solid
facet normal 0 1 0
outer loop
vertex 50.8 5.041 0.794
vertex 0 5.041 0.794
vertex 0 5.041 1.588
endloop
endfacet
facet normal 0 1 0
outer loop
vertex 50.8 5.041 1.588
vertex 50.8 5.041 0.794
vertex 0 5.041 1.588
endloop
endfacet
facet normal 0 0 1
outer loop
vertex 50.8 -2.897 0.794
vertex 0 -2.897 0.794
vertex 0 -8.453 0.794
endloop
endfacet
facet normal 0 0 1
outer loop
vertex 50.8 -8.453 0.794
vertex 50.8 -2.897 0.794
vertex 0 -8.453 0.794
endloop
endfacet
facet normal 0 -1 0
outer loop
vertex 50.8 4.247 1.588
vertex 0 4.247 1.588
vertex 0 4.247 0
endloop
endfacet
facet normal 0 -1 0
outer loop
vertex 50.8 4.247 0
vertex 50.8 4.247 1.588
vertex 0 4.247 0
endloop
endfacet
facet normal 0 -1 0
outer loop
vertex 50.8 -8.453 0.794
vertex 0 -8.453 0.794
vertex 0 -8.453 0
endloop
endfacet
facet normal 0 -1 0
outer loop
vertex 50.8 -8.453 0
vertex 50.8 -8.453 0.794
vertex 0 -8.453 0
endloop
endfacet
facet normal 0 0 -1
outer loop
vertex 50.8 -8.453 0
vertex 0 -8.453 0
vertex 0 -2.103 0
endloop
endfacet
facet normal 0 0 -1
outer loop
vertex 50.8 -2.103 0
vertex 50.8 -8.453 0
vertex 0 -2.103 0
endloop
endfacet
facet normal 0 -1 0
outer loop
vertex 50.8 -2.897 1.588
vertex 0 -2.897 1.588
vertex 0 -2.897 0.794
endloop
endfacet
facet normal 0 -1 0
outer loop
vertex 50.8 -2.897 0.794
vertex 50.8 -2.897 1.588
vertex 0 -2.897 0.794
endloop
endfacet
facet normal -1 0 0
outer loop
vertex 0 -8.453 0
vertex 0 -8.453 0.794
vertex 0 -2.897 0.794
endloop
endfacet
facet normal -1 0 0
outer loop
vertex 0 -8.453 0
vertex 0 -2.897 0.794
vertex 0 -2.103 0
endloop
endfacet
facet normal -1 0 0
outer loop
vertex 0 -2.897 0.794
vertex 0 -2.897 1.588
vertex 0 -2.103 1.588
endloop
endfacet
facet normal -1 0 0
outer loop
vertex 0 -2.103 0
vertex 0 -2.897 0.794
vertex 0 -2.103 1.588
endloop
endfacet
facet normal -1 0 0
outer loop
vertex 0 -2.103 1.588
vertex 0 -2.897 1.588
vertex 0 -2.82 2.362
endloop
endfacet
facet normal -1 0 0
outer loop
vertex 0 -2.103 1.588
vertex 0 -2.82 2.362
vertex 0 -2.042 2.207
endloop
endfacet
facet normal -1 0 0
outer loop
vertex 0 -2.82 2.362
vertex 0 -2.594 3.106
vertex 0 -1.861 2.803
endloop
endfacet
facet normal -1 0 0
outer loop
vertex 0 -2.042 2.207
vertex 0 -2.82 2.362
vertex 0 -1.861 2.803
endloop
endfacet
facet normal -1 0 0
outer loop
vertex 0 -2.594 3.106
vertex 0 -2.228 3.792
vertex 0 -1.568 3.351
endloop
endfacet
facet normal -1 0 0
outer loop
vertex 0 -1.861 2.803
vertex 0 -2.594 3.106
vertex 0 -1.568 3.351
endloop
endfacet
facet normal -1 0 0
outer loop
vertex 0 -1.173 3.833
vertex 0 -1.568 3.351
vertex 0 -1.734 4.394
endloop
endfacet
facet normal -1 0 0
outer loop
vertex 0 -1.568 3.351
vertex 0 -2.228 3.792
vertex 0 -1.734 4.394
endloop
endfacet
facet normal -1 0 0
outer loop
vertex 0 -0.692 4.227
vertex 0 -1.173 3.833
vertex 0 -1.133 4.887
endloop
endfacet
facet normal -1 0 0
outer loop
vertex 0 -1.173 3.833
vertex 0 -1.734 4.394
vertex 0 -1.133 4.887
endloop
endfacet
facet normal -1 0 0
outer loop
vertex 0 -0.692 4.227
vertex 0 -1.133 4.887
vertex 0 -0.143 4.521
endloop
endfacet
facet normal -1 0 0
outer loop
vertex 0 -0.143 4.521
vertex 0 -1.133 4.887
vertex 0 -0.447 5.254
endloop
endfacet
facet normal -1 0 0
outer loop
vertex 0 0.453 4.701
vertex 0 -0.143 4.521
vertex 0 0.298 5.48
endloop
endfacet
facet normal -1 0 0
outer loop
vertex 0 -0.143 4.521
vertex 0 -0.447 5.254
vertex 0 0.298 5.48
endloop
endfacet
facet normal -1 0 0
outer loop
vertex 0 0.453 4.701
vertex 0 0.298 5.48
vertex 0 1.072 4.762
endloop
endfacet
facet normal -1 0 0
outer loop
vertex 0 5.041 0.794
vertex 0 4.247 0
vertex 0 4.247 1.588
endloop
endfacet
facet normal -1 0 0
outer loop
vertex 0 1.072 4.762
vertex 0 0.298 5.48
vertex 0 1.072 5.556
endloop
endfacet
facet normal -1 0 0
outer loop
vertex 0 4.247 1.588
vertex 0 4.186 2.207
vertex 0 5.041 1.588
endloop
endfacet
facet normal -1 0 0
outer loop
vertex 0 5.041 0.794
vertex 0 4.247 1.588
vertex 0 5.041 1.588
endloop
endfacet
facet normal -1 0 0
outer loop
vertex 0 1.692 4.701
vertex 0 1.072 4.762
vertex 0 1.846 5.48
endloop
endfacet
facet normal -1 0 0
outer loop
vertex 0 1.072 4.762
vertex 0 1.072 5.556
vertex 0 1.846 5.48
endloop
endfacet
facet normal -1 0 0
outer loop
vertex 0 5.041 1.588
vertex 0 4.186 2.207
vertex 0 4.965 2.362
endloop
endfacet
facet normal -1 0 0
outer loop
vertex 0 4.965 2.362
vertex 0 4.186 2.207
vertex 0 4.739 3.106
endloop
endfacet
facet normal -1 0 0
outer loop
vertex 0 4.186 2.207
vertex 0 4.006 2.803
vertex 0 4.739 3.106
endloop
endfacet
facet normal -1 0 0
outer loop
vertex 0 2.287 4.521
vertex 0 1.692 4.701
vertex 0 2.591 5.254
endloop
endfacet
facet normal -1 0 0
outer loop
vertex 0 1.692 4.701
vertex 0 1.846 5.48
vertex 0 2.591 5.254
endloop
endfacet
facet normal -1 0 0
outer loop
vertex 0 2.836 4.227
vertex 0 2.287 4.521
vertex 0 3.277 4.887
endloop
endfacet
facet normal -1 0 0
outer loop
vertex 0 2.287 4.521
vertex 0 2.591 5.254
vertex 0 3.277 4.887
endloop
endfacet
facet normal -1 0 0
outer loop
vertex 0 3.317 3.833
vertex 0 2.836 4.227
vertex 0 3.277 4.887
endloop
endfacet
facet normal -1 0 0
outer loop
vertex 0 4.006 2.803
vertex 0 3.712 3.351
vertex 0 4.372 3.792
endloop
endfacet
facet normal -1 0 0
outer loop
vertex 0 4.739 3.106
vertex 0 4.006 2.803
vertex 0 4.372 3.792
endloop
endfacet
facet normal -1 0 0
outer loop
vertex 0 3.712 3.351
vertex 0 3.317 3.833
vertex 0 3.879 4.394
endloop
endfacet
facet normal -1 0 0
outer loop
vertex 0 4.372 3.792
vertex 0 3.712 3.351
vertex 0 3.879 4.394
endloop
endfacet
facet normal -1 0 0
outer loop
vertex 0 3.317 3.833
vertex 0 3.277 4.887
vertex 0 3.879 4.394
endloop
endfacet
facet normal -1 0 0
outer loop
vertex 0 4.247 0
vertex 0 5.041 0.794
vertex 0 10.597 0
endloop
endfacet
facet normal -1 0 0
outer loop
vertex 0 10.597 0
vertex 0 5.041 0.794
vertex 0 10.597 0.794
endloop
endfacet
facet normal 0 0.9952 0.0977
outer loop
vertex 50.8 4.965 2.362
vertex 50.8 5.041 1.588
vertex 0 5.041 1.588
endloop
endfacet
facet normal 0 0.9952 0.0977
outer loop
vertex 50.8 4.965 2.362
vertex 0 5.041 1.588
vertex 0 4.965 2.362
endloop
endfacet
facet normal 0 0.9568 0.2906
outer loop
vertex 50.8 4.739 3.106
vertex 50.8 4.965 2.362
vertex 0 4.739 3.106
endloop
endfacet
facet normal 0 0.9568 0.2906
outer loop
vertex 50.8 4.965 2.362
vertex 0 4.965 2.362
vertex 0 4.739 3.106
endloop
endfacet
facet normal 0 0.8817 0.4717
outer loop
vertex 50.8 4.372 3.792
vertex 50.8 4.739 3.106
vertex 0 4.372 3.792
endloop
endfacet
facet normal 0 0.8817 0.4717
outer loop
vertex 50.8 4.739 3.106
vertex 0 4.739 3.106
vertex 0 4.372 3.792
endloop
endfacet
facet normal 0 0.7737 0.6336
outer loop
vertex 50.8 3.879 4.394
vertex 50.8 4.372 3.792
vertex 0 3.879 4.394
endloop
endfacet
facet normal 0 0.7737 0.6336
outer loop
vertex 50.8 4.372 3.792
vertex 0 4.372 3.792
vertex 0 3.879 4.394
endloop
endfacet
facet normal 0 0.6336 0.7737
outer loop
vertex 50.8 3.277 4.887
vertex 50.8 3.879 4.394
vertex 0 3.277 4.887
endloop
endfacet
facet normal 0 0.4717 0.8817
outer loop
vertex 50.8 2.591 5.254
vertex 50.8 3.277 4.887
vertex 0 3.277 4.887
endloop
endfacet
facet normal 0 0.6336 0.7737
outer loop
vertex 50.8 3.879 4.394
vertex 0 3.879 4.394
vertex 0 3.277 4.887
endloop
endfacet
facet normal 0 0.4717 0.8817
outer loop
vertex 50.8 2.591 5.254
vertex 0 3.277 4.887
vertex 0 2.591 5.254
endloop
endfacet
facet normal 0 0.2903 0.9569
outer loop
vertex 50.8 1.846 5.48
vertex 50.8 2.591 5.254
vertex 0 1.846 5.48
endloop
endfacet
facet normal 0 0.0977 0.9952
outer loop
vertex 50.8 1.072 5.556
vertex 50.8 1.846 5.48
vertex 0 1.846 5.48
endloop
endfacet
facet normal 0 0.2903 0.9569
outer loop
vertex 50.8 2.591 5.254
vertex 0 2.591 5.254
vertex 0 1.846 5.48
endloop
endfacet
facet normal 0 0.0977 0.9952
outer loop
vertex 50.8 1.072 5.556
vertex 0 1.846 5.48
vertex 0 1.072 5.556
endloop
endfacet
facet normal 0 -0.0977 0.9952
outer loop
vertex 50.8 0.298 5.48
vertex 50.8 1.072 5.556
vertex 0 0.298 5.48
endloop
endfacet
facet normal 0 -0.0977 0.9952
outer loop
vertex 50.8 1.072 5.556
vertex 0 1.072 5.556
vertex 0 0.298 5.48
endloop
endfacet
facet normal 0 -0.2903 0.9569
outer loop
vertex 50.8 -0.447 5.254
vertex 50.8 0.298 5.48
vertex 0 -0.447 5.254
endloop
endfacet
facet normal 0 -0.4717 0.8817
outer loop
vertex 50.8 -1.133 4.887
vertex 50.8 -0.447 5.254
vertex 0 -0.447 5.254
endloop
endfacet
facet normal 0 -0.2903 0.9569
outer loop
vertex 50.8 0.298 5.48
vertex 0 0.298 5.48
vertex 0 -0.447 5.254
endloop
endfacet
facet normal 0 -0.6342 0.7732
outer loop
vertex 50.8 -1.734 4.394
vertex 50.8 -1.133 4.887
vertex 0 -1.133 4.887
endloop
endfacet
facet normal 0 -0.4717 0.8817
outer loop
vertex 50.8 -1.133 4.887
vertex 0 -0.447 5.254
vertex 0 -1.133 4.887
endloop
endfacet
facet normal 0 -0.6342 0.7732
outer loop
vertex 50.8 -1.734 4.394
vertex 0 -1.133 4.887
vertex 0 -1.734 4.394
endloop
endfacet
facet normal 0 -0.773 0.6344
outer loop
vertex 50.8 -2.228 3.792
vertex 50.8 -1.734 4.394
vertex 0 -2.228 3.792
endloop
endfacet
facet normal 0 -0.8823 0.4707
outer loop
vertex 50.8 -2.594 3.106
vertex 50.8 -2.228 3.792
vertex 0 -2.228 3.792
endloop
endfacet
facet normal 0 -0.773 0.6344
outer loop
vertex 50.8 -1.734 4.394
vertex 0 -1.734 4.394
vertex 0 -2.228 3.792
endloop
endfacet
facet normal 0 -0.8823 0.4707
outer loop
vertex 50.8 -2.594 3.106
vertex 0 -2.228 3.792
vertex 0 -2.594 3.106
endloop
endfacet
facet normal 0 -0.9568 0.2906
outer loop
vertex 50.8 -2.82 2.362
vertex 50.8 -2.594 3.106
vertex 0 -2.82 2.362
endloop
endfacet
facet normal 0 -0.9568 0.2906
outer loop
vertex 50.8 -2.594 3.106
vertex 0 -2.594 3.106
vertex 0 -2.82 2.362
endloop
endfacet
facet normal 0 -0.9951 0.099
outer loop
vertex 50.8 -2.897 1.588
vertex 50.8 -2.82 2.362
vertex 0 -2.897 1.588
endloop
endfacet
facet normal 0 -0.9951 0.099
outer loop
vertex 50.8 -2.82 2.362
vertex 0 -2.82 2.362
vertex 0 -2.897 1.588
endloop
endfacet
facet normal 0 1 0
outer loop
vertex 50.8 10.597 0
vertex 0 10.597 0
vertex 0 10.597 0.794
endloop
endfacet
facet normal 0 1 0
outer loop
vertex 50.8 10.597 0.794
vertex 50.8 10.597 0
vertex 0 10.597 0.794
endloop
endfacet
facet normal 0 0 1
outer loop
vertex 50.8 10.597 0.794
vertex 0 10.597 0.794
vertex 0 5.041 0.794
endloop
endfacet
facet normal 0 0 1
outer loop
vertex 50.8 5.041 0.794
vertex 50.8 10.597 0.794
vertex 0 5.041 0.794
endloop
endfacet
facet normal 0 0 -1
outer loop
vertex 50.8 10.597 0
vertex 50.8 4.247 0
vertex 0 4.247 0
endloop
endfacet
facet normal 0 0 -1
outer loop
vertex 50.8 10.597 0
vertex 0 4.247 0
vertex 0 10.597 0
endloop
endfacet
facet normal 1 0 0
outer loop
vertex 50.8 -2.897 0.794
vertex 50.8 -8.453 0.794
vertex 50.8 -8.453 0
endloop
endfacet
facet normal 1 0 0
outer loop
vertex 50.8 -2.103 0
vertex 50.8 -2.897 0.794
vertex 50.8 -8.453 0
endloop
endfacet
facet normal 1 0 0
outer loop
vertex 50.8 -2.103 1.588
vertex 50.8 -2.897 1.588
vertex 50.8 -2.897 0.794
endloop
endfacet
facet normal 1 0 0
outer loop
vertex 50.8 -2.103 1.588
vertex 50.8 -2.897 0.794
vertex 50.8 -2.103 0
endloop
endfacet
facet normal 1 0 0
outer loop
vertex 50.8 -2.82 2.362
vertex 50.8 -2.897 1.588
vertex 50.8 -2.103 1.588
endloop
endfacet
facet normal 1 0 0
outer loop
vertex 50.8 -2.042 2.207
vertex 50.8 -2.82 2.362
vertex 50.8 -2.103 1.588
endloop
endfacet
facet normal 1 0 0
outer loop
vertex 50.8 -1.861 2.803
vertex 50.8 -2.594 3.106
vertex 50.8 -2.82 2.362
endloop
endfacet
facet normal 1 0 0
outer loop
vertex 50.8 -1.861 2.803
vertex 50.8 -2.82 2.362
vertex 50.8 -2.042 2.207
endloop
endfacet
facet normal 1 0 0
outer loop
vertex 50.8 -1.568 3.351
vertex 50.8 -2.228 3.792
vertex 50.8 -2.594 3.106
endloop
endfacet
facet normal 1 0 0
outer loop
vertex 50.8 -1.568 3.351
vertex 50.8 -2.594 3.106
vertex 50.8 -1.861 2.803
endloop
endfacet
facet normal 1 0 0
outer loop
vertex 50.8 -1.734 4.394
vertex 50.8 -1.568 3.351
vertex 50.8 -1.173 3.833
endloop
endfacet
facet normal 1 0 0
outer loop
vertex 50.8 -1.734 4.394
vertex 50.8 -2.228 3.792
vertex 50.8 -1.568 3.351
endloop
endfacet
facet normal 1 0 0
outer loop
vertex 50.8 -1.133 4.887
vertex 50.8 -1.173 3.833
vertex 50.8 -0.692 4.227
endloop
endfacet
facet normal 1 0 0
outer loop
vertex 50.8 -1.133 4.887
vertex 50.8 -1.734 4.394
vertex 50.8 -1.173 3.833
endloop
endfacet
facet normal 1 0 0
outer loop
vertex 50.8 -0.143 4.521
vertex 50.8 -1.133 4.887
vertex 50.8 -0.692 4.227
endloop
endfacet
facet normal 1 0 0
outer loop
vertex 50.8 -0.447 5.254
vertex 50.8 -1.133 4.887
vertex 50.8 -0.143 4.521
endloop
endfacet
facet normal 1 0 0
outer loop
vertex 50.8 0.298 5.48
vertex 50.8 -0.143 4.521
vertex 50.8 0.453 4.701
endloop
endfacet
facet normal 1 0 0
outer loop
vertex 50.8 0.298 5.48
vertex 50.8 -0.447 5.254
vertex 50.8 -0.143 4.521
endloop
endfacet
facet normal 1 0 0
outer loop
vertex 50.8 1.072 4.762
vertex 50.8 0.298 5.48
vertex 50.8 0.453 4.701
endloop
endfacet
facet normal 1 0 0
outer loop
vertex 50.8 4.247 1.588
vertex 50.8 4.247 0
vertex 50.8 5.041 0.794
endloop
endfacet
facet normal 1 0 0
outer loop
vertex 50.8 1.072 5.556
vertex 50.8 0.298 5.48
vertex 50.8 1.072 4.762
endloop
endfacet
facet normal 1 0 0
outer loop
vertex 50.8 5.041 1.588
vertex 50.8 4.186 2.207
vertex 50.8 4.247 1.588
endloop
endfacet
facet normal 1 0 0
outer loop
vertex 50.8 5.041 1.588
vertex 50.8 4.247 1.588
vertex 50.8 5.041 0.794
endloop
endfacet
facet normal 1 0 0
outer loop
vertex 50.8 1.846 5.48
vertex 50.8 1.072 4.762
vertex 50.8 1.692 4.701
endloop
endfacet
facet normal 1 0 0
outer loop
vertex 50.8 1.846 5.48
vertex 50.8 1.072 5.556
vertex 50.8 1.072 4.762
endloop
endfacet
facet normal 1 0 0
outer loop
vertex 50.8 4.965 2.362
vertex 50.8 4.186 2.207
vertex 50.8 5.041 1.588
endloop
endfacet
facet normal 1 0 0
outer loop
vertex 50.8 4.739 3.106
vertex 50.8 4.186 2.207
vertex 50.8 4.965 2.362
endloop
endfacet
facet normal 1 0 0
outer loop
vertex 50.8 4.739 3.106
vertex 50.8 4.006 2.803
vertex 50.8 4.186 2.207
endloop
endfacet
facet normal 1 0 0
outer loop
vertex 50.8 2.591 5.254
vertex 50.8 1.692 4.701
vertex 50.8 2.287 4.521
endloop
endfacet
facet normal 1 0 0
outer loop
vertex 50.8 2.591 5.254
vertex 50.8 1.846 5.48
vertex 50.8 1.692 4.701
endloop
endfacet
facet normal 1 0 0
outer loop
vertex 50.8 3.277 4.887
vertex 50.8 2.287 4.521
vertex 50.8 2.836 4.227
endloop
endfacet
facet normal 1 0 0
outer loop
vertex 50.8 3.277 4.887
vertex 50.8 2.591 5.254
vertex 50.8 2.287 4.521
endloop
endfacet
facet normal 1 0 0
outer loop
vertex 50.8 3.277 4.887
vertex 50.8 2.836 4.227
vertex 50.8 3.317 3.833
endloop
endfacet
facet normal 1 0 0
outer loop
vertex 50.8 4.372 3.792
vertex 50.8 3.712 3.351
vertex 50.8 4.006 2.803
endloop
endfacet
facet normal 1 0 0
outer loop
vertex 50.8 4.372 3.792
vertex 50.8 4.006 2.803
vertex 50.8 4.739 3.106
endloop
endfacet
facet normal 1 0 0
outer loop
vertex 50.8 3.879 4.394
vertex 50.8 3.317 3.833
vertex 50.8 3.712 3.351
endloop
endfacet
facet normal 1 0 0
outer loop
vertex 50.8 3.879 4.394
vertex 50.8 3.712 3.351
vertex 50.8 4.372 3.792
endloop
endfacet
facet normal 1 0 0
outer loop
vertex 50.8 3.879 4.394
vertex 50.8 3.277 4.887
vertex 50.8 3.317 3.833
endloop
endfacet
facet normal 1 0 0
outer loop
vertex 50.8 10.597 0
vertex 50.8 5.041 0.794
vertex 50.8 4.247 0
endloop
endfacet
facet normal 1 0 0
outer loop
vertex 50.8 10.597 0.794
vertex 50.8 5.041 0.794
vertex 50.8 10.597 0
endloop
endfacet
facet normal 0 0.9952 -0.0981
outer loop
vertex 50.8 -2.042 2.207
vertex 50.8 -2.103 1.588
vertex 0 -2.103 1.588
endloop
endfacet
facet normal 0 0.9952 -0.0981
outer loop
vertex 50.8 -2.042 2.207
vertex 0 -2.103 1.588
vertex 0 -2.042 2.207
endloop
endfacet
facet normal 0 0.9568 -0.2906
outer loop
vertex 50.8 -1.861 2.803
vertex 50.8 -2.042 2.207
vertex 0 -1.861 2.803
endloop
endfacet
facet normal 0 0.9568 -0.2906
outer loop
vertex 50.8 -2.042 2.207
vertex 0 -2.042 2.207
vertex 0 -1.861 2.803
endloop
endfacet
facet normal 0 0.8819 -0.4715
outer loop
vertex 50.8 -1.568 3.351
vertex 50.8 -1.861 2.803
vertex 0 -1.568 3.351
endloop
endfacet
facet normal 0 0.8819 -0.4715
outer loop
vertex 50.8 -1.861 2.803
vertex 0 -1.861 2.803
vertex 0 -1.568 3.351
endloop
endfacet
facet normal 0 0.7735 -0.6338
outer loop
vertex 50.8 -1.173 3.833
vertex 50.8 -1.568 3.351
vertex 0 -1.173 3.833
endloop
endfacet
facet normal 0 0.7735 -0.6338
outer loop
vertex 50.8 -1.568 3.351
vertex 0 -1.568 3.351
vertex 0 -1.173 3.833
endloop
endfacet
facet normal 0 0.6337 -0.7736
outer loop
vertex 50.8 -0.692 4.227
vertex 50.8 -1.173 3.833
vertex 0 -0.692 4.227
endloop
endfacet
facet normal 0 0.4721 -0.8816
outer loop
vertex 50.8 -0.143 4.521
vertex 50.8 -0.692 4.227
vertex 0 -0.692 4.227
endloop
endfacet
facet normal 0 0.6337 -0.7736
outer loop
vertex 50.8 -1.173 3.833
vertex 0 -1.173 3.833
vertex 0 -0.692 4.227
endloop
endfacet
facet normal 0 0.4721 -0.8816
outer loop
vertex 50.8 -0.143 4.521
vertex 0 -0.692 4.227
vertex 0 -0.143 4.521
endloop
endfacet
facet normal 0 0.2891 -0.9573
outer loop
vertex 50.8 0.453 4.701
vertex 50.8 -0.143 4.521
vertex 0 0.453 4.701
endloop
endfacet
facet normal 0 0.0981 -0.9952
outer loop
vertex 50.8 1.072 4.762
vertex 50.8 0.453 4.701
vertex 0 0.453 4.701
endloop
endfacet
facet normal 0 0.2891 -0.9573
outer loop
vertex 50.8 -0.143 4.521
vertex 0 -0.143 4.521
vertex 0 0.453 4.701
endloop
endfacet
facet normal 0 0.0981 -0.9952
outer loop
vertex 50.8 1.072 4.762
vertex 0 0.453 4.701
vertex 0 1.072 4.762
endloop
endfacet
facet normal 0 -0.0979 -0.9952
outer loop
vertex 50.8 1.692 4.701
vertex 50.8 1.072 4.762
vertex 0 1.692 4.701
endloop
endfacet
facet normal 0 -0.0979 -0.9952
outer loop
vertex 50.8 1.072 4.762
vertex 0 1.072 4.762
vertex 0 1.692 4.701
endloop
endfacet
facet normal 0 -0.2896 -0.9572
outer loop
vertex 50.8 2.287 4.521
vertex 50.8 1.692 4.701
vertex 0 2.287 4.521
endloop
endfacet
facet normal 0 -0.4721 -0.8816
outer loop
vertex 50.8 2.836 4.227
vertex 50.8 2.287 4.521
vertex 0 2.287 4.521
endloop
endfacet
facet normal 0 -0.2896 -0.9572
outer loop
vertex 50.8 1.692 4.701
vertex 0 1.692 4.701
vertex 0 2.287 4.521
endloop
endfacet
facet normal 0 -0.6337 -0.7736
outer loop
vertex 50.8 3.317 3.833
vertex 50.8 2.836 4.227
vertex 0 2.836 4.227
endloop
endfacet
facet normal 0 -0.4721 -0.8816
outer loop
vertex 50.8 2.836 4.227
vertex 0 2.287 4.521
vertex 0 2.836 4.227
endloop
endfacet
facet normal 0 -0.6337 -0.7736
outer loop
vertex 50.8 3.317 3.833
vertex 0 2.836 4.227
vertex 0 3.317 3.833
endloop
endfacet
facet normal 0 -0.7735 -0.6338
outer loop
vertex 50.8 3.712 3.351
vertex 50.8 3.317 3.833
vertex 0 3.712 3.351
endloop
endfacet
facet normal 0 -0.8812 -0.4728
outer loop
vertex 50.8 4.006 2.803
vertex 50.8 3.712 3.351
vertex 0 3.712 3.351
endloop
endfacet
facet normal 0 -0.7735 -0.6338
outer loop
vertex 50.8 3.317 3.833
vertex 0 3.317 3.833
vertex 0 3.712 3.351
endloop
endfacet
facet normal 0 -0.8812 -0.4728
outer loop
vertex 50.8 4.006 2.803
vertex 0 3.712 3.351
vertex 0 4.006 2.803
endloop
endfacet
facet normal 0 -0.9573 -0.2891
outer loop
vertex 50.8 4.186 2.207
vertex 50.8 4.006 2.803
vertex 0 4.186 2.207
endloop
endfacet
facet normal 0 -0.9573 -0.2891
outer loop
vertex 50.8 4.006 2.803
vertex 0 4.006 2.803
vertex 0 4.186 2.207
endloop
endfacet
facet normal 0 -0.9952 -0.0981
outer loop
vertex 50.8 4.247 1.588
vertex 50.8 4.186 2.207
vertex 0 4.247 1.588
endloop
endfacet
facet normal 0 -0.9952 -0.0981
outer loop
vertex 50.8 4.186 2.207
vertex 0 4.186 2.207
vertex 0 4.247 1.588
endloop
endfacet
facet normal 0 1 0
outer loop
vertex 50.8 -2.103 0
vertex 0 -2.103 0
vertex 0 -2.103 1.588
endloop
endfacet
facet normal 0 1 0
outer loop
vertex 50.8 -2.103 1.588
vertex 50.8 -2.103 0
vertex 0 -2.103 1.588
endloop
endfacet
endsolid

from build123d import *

# Parameters (mm, degrees)
F1_DEPTH = 50.8


with BuildPart() as f1:
    # F0 (on Right) → F1 (new body)
    with BuildSketch(Plane.YZ):
        with BuildLine():
            Line((-8.452803, 0), (-2.102803, 0))
            Line((-2.102803, 0), (-2.102803, 1.5875))
            ThreePointArc((-2.102803, 1.5875), (1.072197, 4.7625), (4.247197, 1.5875))
            Line((4.247197, 1.5875), (4.247197, 0))
            Line((4.247197, 0), (10.597197, 0))
            Line((10.597197, 0), (10.597197, 0.79375))
            Line((10.597197, 0.79375), (5.040947, 0.79375))
            Line((5.040947, 0.79375), (5.040947, 1.5875))
            ThreePointArc((5.040947, 1.5875), (1.072197, 5.55625), (-2.896553, 1.5875))
            Line((-2.896553, 1.5875), (-2.896553, 0.79375))
            Line((-2.896553, 0.79375), (-8.452803, 0.79375))
            Line((-8.452803, 0.79375), (-8.452803, 0))
        make_face()
    extrude(amount=F1_DEPTH)


solid = f1.part
